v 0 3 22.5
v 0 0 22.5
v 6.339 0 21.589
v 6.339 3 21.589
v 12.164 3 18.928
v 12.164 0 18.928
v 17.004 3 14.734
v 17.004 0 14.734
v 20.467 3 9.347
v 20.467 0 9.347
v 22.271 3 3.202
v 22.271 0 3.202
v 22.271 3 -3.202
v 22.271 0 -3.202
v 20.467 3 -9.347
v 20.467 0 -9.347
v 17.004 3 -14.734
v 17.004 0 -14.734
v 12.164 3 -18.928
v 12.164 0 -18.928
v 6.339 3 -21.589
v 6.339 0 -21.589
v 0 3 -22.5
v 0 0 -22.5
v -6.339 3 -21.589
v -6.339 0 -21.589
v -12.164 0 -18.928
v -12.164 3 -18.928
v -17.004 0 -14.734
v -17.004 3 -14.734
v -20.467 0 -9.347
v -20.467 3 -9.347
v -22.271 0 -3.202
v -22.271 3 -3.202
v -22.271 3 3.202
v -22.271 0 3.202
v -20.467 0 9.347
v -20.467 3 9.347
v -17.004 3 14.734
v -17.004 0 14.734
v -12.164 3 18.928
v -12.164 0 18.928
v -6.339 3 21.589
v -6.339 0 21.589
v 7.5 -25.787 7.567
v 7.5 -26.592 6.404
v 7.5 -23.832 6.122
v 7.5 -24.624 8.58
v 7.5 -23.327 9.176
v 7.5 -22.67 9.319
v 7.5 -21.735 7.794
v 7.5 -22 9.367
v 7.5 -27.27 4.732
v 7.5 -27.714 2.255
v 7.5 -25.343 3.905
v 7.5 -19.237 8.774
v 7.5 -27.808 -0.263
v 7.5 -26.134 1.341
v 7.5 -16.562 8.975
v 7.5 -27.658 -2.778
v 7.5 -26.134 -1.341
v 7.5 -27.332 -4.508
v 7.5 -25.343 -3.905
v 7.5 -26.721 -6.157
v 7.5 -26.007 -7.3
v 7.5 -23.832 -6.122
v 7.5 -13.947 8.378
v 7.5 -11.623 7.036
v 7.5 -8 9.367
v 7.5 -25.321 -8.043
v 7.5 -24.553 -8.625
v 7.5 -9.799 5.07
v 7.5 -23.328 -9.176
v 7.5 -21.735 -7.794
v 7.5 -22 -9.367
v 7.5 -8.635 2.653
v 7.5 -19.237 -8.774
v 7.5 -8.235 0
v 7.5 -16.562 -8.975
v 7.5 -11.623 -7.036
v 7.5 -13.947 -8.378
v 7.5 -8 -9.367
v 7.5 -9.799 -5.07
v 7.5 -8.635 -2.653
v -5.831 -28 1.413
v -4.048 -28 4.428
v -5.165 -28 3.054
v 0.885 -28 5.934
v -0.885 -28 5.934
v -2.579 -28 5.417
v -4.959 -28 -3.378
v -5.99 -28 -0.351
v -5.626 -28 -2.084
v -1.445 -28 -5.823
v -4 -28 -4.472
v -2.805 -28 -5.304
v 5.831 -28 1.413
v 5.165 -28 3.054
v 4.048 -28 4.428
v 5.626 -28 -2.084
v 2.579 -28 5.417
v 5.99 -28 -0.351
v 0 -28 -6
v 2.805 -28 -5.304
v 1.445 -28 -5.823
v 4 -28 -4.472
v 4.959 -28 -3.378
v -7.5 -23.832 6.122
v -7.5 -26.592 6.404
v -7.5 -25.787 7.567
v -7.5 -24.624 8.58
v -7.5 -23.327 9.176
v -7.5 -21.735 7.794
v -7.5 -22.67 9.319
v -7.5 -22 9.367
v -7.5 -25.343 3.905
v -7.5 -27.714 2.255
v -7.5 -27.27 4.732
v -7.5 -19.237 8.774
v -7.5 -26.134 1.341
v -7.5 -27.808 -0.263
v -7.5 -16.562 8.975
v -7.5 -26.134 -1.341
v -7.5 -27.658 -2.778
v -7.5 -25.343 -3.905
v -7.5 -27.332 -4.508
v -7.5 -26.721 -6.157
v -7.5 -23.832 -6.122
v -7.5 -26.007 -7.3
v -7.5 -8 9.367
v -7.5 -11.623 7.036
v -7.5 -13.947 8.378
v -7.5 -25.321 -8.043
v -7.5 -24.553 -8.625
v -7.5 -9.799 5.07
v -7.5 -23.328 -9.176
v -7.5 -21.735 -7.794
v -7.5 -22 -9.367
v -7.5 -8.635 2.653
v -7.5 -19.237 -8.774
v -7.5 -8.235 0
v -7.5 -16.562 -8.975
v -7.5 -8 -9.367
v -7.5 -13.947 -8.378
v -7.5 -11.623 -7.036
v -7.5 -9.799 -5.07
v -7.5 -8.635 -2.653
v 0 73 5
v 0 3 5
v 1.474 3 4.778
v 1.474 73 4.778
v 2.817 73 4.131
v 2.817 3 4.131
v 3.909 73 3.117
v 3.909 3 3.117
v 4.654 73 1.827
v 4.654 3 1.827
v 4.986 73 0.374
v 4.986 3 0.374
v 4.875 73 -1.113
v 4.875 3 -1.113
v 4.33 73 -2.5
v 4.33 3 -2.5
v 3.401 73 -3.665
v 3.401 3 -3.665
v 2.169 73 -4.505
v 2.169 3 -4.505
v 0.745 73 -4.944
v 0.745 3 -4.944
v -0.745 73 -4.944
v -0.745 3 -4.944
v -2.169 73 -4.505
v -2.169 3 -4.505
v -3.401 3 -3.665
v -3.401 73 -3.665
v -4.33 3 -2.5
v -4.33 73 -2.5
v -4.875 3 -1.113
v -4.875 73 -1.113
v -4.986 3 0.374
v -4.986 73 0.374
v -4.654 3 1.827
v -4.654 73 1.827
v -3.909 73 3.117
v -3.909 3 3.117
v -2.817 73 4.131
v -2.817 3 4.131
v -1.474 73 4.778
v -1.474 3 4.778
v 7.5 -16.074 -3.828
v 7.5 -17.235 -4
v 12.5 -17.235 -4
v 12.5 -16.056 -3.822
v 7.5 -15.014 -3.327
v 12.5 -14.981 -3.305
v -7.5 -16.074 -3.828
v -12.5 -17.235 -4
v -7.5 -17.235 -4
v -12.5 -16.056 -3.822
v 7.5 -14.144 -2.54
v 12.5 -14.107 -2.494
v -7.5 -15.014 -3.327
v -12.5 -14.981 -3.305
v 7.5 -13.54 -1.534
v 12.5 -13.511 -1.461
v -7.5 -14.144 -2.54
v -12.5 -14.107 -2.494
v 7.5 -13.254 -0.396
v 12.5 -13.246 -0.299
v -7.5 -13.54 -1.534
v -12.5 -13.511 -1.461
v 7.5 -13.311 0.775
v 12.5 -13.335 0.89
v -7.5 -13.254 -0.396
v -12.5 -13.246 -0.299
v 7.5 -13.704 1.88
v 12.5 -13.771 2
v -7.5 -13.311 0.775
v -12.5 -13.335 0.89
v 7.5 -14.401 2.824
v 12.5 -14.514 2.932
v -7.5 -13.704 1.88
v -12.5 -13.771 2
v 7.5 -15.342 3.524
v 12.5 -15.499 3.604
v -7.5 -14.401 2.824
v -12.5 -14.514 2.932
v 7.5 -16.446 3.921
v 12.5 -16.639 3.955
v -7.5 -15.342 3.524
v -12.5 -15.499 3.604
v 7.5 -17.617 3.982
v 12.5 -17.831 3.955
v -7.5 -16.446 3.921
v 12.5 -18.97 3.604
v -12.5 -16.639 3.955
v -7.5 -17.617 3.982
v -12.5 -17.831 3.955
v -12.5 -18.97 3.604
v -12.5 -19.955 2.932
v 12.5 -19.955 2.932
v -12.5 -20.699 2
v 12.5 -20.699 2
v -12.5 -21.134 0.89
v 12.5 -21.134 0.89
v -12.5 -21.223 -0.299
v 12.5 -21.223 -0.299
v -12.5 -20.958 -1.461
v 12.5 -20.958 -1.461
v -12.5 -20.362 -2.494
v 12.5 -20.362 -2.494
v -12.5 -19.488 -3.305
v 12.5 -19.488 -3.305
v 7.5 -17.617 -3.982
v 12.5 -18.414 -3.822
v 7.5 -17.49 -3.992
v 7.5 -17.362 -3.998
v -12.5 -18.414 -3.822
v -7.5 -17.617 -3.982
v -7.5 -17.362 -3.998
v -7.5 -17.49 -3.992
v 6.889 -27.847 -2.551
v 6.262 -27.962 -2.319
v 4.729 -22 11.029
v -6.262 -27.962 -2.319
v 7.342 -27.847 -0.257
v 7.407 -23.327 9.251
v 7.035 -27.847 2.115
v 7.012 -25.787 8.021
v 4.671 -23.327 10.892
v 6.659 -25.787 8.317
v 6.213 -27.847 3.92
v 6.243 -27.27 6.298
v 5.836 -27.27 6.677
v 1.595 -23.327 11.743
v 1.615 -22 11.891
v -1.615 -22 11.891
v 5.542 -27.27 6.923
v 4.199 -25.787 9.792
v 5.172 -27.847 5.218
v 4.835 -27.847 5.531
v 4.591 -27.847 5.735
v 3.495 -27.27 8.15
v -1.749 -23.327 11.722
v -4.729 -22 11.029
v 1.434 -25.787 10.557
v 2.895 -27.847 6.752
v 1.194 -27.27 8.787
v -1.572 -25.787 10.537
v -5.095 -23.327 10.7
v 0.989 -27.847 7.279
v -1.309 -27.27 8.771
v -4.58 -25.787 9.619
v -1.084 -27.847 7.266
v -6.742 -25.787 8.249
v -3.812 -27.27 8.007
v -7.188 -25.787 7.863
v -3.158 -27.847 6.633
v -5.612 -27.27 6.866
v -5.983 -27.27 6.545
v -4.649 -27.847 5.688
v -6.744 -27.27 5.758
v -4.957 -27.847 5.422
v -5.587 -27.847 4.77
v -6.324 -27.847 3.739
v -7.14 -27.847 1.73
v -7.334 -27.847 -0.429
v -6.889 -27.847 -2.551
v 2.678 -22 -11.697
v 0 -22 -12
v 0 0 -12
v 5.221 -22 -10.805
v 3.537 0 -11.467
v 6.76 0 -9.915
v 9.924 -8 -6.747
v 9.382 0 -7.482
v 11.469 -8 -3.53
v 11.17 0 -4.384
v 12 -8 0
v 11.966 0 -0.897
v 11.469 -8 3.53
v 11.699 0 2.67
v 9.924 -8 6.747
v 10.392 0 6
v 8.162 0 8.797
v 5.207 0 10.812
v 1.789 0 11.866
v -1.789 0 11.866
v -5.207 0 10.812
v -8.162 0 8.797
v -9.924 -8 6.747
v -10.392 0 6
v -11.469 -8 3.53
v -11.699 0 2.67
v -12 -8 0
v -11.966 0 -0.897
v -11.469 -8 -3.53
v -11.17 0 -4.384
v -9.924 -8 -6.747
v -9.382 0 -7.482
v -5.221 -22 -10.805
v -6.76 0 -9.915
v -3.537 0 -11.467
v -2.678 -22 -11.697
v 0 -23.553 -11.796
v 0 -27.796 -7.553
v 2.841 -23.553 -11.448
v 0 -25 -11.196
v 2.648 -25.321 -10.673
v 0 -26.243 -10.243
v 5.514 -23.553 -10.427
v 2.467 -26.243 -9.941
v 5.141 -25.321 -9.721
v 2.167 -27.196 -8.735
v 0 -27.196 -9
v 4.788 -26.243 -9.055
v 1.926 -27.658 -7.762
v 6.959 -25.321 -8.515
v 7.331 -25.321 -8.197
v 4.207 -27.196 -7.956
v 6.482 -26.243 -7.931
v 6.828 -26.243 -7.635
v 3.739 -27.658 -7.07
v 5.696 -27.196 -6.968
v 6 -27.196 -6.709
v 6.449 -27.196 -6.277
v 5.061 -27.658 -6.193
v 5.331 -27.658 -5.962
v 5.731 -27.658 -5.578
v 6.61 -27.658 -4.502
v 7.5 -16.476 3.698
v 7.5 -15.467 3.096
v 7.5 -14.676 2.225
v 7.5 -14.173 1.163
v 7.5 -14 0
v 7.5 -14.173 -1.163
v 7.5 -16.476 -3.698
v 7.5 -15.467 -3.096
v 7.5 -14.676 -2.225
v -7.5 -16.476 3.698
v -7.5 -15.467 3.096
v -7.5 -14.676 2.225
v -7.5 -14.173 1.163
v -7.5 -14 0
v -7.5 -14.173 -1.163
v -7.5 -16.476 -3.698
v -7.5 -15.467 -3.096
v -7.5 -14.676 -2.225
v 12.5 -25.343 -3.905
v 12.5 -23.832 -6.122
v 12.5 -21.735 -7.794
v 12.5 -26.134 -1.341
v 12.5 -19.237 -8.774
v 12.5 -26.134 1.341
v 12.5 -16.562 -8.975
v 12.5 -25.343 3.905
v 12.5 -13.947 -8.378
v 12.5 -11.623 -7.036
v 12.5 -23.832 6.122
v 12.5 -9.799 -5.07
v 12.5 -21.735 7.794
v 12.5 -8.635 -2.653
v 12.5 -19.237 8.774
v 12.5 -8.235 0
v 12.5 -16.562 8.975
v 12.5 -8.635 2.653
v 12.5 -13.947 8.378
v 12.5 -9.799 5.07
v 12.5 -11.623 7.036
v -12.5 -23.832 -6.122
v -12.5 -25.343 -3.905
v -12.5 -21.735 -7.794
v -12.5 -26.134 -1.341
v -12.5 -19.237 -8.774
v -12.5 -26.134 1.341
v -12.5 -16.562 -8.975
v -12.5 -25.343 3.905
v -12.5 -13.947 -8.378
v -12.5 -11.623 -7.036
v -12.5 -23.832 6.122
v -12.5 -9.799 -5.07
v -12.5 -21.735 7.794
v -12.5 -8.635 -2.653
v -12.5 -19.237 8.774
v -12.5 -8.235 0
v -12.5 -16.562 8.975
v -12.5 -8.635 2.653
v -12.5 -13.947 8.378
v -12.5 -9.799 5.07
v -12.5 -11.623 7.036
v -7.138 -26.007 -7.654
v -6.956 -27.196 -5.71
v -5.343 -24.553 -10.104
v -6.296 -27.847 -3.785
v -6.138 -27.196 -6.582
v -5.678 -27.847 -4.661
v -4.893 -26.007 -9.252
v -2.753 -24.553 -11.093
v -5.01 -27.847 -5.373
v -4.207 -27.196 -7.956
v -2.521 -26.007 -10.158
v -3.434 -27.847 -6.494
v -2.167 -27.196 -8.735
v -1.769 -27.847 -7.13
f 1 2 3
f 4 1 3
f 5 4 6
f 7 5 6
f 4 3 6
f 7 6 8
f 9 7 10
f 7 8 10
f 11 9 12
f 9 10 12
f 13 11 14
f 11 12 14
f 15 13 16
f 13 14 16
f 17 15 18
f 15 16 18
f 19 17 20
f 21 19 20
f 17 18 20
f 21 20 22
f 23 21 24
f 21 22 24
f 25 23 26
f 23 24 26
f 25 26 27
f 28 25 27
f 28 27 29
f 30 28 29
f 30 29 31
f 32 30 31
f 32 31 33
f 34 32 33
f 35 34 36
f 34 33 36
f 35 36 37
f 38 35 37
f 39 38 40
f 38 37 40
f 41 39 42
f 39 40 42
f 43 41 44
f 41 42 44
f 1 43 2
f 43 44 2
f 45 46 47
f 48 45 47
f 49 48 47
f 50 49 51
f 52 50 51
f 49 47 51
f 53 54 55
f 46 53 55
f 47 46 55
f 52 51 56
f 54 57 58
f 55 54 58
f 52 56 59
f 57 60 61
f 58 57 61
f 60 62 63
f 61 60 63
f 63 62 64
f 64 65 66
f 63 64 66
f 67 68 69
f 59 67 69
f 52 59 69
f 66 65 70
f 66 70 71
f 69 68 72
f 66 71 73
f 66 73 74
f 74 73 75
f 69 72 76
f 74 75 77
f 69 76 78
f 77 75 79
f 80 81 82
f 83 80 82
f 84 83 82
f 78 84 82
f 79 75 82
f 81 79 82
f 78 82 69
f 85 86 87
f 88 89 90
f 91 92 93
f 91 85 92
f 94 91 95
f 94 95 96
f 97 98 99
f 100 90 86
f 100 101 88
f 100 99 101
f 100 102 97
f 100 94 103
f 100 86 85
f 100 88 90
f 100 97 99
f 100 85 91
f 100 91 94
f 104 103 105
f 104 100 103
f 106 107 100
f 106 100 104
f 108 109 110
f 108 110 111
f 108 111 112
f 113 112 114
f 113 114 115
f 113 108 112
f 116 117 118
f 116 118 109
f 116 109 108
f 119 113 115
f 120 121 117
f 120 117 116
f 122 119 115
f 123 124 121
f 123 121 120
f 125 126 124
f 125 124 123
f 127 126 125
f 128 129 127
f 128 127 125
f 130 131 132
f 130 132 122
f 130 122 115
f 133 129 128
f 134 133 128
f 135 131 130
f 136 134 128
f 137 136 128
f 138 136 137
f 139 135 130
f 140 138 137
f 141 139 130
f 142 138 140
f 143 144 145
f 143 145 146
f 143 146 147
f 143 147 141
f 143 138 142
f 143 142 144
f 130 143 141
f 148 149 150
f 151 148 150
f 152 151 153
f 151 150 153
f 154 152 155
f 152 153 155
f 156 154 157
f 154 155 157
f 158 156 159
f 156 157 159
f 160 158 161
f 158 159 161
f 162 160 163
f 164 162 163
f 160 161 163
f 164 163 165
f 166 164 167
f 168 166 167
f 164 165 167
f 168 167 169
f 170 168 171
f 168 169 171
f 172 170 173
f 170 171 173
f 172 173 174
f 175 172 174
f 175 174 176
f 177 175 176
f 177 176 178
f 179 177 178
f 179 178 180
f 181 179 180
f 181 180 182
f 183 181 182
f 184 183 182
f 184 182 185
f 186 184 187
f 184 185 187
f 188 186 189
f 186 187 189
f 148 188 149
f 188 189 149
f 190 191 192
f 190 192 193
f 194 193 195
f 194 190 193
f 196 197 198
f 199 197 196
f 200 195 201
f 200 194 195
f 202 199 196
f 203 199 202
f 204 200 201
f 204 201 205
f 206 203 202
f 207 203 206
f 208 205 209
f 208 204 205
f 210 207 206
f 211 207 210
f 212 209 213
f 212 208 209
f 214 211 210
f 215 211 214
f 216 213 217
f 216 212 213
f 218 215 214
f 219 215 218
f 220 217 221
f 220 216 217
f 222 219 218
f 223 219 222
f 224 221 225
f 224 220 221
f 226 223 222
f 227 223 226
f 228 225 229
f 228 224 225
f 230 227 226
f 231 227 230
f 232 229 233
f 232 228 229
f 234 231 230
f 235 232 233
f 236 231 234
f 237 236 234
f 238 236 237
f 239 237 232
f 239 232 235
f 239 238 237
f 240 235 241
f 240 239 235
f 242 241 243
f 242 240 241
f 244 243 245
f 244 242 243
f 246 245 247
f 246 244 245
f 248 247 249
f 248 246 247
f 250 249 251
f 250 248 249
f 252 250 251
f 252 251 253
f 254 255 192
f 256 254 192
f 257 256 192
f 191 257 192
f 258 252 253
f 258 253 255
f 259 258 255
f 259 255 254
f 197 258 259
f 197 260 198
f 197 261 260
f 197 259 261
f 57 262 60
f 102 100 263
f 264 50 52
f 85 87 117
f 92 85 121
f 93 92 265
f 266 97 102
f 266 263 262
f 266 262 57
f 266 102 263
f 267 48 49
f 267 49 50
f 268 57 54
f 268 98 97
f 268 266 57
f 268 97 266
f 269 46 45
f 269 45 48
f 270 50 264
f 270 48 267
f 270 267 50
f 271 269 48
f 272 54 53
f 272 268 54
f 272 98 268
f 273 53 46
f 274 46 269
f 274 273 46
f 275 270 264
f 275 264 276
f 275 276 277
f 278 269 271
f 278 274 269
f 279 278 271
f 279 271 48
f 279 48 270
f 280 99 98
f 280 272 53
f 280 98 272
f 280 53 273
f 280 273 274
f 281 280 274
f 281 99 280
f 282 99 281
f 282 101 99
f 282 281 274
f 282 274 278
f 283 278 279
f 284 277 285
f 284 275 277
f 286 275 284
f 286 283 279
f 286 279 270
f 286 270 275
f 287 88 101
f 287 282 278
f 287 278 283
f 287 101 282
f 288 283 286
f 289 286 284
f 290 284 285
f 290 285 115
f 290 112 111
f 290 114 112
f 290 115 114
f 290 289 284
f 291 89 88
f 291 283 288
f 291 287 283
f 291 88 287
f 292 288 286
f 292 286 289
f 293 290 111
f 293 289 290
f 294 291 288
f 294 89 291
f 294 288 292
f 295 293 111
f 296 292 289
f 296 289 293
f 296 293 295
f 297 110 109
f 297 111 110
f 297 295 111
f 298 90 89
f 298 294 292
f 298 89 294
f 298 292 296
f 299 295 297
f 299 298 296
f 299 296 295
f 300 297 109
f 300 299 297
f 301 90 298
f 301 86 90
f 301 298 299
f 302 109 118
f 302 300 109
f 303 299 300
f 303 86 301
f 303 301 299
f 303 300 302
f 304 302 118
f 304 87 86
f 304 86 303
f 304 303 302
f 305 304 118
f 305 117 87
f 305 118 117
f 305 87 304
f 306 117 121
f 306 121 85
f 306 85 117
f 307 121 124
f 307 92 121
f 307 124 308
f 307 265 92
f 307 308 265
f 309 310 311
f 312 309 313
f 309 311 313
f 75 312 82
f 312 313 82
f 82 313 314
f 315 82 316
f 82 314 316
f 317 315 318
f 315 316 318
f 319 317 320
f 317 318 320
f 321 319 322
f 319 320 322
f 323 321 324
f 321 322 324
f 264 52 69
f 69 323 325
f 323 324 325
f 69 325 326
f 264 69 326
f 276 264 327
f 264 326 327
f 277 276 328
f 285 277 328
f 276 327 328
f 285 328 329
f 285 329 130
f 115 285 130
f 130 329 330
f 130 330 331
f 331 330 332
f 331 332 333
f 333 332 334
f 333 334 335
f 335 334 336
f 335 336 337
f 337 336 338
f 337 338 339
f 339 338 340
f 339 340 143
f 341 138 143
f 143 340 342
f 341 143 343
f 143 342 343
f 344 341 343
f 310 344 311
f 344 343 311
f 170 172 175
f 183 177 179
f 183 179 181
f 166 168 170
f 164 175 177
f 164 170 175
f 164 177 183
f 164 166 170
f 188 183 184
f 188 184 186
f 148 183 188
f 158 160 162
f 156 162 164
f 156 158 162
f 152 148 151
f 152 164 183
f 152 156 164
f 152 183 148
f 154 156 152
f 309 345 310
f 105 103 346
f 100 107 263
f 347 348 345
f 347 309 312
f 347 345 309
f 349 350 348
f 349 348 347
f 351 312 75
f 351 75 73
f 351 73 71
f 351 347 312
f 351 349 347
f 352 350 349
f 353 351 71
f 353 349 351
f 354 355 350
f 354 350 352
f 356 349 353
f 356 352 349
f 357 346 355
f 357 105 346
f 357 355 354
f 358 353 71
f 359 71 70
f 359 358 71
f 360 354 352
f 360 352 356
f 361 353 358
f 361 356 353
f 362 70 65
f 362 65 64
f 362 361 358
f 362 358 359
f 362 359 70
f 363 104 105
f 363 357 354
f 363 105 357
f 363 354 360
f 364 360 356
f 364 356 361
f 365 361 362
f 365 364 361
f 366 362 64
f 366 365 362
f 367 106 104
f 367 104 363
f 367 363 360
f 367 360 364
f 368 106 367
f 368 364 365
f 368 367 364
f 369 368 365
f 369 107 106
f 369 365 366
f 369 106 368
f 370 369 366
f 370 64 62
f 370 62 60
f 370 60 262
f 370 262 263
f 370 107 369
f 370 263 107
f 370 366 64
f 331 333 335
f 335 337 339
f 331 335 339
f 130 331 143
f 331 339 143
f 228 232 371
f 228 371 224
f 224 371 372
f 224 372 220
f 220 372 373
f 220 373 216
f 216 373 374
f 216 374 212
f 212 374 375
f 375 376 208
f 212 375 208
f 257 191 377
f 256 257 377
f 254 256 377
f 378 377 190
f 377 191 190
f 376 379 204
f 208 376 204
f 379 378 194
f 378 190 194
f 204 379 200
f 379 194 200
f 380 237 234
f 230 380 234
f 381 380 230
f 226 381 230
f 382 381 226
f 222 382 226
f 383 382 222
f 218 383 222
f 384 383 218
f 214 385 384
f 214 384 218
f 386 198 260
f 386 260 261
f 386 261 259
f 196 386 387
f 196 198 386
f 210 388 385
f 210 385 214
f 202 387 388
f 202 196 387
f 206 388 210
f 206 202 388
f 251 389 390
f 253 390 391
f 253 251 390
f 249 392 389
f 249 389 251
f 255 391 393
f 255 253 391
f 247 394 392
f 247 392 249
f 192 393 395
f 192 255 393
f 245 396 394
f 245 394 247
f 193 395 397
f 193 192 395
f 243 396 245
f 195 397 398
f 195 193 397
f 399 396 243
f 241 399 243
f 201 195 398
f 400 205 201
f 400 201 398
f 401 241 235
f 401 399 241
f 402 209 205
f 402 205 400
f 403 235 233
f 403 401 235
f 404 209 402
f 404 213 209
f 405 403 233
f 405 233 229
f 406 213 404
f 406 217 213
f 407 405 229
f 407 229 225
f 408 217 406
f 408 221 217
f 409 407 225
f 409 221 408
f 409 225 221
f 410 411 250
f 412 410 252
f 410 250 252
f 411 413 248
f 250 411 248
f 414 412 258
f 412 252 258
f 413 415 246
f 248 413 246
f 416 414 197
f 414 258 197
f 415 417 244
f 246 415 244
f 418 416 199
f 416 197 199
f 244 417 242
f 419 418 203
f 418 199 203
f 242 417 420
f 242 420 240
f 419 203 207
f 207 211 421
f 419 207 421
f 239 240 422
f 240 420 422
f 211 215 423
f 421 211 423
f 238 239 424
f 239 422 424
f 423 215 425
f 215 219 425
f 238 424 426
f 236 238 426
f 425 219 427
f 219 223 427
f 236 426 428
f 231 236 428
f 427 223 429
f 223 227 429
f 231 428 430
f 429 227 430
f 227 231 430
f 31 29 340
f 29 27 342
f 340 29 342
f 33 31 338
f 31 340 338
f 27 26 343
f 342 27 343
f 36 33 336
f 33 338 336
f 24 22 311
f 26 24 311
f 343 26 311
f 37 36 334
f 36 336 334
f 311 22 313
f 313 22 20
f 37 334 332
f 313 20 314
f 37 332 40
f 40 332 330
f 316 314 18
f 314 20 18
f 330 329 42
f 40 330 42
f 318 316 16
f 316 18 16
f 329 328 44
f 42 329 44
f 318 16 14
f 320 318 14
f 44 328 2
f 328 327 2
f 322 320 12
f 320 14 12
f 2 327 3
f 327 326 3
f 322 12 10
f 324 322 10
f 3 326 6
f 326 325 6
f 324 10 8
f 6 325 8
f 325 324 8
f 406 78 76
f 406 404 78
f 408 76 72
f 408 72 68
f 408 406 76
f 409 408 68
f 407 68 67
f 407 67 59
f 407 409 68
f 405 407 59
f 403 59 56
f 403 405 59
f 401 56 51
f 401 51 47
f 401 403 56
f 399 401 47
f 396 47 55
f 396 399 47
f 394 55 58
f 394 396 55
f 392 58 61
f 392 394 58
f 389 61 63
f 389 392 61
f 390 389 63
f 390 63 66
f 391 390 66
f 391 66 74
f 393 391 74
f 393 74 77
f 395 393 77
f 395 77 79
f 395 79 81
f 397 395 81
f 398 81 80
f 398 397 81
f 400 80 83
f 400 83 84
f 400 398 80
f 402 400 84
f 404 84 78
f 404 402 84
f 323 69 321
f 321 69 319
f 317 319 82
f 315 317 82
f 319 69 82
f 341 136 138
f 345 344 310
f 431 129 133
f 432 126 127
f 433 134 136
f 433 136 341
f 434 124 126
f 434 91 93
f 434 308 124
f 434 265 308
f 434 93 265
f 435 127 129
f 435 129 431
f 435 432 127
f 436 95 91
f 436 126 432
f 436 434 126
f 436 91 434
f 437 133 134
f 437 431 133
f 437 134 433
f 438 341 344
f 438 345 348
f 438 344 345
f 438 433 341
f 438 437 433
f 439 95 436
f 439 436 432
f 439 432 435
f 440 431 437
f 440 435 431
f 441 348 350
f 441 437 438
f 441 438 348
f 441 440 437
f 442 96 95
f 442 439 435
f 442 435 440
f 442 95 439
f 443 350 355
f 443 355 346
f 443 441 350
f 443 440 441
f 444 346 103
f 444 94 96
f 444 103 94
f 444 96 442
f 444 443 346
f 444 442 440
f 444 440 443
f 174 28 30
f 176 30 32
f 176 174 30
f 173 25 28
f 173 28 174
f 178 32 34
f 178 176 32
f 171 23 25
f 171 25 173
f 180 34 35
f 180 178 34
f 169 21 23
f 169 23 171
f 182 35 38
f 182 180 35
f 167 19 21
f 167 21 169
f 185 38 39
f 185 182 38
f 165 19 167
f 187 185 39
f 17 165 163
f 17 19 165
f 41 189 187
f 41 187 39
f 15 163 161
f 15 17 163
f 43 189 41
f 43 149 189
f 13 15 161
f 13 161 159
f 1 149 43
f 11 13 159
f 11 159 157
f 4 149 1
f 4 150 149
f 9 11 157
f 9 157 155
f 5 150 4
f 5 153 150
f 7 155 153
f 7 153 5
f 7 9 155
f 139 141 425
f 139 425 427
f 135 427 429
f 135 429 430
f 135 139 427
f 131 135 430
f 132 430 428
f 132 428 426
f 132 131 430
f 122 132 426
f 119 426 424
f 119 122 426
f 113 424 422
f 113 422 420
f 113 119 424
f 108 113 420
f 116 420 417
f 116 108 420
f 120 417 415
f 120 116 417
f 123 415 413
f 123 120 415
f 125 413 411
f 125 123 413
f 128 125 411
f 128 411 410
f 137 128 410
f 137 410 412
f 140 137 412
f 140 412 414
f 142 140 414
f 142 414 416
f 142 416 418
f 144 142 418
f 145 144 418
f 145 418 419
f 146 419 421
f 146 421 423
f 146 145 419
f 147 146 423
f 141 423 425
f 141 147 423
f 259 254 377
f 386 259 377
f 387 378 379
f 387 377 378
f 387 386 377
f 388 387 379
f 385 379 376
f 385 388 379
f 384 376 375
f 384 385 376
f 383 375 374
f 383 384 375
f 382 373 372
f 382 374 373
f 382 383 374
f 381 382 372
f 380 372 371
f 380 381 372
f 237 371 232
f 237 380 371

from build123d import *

# Parameters (mm, degrees)
SKETCH1_R               = 22.5
BOSS_EXTRUDE1_DEPTH     = 3
SKETCH2_R               = 5
BOSS_EXTRUDE2_DEPTH     = 70
SKETCH3_R               = 12
BOSS_EXTRUDE3_DEPTH     = 28
CUT_EXTRUDE1_DEPTH      = 80.633535649
CUT_EXTRUDE1_DEPTH_BACK = 80.633535649
SKETCH4_W               = 12.026752758
SKETCH4_H               = 20
FILLET1_R               = 6
CUT_EXTRUDE3_DEPTH      = 83.068568892
CUT_EXTRUDE3_DEPTH_BACK = 83.068568892
SKETCH6_R               = 4
SKETCH9_R               = 9
SKETCH9_R_2             = 4
BOSS_EXTRUDE4_DEPTH     = 12.5


with BuildPart() as part:
    # Sketch1 → Boss-Extrude1 (new body)
    with BuildSketch(Plane(origin=(0, 0, 0), x_dir=(1, 0, 0), z_dir=(0, 1, 0))):
        with Locations(Location((0, 0, 0), (0, 0, 270))):
            Circle(SKETCH1_R)
    extrude(amount=BOSS_EXTRUDE1_DEPTH)

    # Sketch2 → Boss-Extrude2 (add)
    with BuildSketch(Plane(origin=(0, 3, 0), x_dir=(1, 0, 0), z_dir=(0, 1, 0))):
        with Locations(Location((0, 0, 0), (0, 0, 270))):
            Circle(SKETCH2_R)
    extrude(amount=BOSS_EXTRUDE2_DEPTH)

    # Sketch3 → Boss-Extrude3 (add)
    with BuildSketch(Plane.XZ):
        with Locations(Location((0, 0, 0), (0, 0, 270))):
            Circle(SKETCH3_R)
    extrude(amount=BOSS_EXTRUDE3_DEPTH)

    # Sketch4 → Cut-Extrude1 (cut, two sides: drawn at the far end of the back side and taken through both)
    with BuildSketch(Plane.XY.offset(-CUT_EXTRUDE1_DEPTH_BACK)):
        with Locations((13.513376379, -18)):
            Rectangle(SKETCH4_W, SKETCH4_H)
        with Locations((-13.513376379, -18)):
            Rectangle(SKETCH4_W, SKETCH4_H)
    extrude(amount=CUT_EXTRUDE1_DEPTH + CUT_EXTRUDE1_DEPTH_BACK, mode=Mode.SUBTRACT)

    # Fillet1
    # the kernel refuses this fillet: 6 mm, written as the material it takes off along each edge
    with BuildSketch(Plane(origin=(0, -28, 0), x_dir=(0.9377485647369962, 0, -0.3473148849872455), z_dir=(-0.3473148849872455, 0, -0.9377485647369962))) as fillet1_piece_1:
        with BuildLine():
            CenterArc((12 - FILLET1_R, -FILLET1_R), FILLET1_R, 0, 90)
            Line((12 - FILLET1_R, 0), (12, 0))
            Line((12, 0), (12, -FILLET1_R))
        make_face()
    revolve(axis=Axis((0, -28, 0), (0, -1, 0)), revolution_arc=220.646338322, mode=Mode.SUBTRACT)
    with BuildSketch(Plane(origin=(0, -28, 0), x_dir=(0, 0, -1), z_dir=(-1, 0, 0))) as fillet1_piece_2:
        with BuildLine():
            CenterArc((12 - FILLET1_R, -FILLET1_R), FILLET1_R, 0, 90)
            Line((12 - FILLET1_R, 0), (12, 0))
            Line((12, 0), (12, -FILLET1_R))
        make_face()
    revolve(axis=Axis((0, -28, 0), (0, -1, 0)), revolution_arc=110.307225346, mode=Mode.SUBTRACT)
    with BuildSketch(Plane(origin=(0, -28, 0), x_dir=(-0.9378451764605575, 0, 0.34705392230842963), z_dir=(0.34705392230842963, 0, 0.9378451764605575))) as fillet1_piece_3:
        with BuildLine():
            CenterArc((12 - FILLET1_R, -FILLET1_R), FILLET1_R, 0, 90)
            Line((12 - FILLET1_R, 0), (12, 0))
            Line((12, 0), (12, -FILLET1_R))
        make_face()
    revolve(axis=Axis((0, -28, 0), (0, -1, 0)), revolution_arc=110.307225346, mode=Mode.SUBTRACT)

    # Sketch6 → Cut-Extrude3 (cut, two sides: drawn at the far end of the back side and taken through both)
    with BuildSketch(Plane(origin=(7.5, 0, 0), x_dir=(0, 0, -1), z_dir=(1, 0, 0)).offset(-CUT_EXTRUDE3_DEPTH_BACK)):
        with Locations(Location((0, -18, 0), (0, 0, 90))):
            Circle(SKETCH6_R)
    extrude(amount=CUT_EXTRUDE3_DEPTH + CUT_EXTRUDE3_DEPTH_BACK, mode=Mode.SUBTRACT)

    # Sketch9 → Boss-Extrude4 (add, symmetric)
    with BuildSketch(Plane(origin=(0, 0, 0), x_dir=(0, 0, -1), z_dir=(1, 0, 0))):
        with Locations(Location((0, -17.234671311, 0), (0, 0, 90))):
            Circle(SKETCH9_R)
        with Locations((0, -17.234671311)):
            Circle(SKETCH9_R_2, mode=Mode.SUBTRACT)
    extrude(amount=BOSS_EXTRUDE4_DEPTH, both=True)


solid = part.part
